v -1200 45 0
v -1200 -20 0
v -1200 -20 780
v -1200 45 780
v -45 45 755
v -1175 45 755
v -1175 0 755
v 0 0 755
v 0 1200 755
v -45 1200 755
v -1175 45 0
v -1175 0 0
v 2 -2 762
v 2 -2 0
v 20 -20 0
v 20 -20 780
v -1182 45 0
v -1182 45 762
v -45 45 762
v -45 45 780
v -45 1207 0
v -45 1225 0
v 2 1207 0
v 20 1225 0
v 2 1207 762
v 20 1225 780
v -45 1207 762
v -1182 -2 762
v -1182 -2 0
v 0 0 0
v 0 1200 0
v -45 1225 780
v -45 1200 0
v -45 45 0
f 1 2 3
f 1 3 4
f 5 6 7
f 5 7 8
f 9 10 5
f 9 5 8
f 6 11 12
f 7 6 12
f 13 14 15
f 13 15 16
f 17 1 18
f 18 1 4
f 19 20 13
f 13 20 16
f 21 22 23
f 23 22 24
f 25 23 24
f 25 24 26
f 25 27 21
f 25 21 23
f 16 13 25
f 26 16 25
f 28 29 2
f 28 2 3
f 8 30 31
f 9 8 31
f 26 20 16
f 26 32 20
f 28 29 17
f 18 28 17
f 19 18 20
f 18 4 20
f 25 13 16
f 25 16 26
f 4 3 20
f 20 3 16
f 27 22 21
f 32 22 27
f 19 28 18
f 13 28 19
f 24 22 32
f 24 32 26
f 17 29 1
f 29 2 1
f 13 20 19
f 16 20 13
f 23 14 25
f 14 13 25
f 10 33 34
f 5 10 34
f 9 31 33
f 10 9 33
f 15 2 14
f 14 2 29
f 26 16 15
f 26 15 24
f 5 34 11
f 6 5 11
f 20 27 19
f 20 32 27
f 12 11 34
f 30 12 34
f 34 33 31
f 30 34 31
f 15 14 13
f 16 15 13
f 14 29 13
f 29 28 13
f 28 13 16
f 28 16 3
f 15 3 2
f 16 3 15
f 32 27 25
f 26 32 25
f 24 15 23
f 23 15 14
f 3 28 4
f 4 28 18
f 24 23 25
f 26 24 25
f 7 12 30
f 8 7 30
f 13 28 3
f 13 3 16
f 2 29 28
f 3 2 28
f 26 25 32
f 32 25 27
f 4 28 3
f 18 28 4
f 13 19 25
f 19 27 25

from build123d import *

# Parameters (mm, degrees)
F1_DEPTH   = 755
F3_W       = 1220
F3_H       = 780
F4_DEPTH   = 18
F5_SIZE    = 17.99999
F7_W       = 1245
F7_H       = 780
F8_DEPTH   = 18
F9_SIZE    = 17.99999
F11_W      = 65
F11_H      = 780
F12_DEPTH  = 18
F13_SIZE   = 17.99999
F15_W      = 65
F15_H      = 780
F16_DEPTH  = 18
F17_SIZE   = 17.99999
F22_DEPTH  = 18
F23_DEPTH  = 18
F24_SIZE   = 17.99999
F24_2_SIZE = 17.99999


# Not quite as in the source:
# - a fillet or chamfer is up to 0.001 mm smaller than in the source, because OpenCascade refuses the exact size


with BuildPart() as f1:
    # F0 (on Top) → F1 (new body)
    with BuildSketch(Plane.XY):
        Polygon((-1175, 45), (-1175, 0), (0, 0), (0, 1200), (-45, 1200), (-45, 45), align=None)
    extrude(amount=F1_DEPTH)


with BuildPart() as f4:
    # F3 (on offset) → F4 (new body)
    with BuildSketch(Plane.XZ.offset(20)):
        with Locations((-590, 390)):
            Rectangle(F3_W, F3_H)
    extrude(amount=-F4_DEPTH)

    # F5 (size 18 in the source; OpenCascade refuses exactly that, so slightly less here)
    f5_edges = [f4.edges().sort_by_distance(p)[0] for p in [
        (20, -2, 390),
        (-590, -2, 780),
        (-1200, -2, 390),
    ]]
    chamfer(f5_edges, length=F5_SIZE)


with BuildPart() as f8:
    # F7 (on offset) → F8 (new body)
    with BuildSketch(Plane.YZ.offset(20)):
        with Locations((602.5, 390)):
            Rectangle(F7_W, F7_H)
    extrude(amount=-F8_DEPTH)

    # F9 (size 18 in the source; OpenCascade refuses exactly that, so slightly less here)
    f9_edges = [f8.edges().sort_by_distance(p)[0] for p in [
        (2, -20, 390),
        (2, 602.5, 780),
        (2, 1225, 390),
    ]]
    chamfer(f9_edges, length=F9_SIZE)


with BuildPart() as f12:
    # F11 (on face) → F12 (new body)
    with BuildSketch(Plane.YZ.offset(-1200)):
        with Locations((12.5, 390)):
            Rectangle(F11_W, F11_H)
    extrude(amount=F12_DEPTH)

    # F13 (size 18 in the source; OpenCascade refuses exactly that, so slightly less here)
    f13_edges = [f12.edges().sort_by_distance(p)[0] for p in [
        (-1182, 12.5, 780),
        (-1182, -20, 390),
    ]]
    chamfer(f13_edges, length=F13_SIZE)


with BuildPart() as f16:
    # F15 (on face) → F16 (new body)
    with BuildSketch(Plane.XZ.offset(-1225)):
        with Locations((-12.5, 390)):
            Rectangle(F15_W, F15_H)
    extrude(amount=F16_DEPTH)

    # F17 (size 18 in the source; OpenCascade refuses exactly that, so slightly less here)
    f17_edges = [f16.edges().sort_by_distance(p)[0] for p in [
        (20, 1207, 390),
        (-12.5, 1207, 780),
    ]]
    chamfer(f17_edges, length=F17_SIZE)


with BuildPart() as f22:
    # F21 (on face) → F22 (new body)
    with BuildSketch(Plane(origin=(0, 0, 780), x_dir=(1, 0, 0), z_dir=(0, 0, -1))):
        Polygon((-1200, 20), (-1200, -45), (-45, -45), (20, 20), align=None)
    extrude(amount=F22_DEPTH)

    # F24 (size 18 in the source; OpenCascade refuses exactly that, so slightly less here)
    f24_edges = [f22.edges().sort_by_distance(p)[0] for p in [
        (-1200, 12.5, 762),
        (-590, -20, 762),
    ]]
    chamfer(f24_edges, length=F24_SIZE)


with BuildPart() as f23:
    # F19 (on face) → F23 (new body)
    with BuildSketch(Plane.XY.offset(780)):
        Polygon((-45, 45), (20, -20), (20, 1225), (-45, 1225), align=None)
    extrude(amount=-F23_DEPTH)

    # F24#2 (size 18 in the source; OpenCascade refuses exactly that, so slightly less here)
    f24_2_edges = [f23.edges().sort_by_distance(p)[0] for p in [
        (20, 602.5, 762),
        (-12.5, 1225, 762),
    ]]
    chamfer(f24_2_edges, length=F24_2_SIZE)


solid = Compound([f1.part, f4.part, f8.part, f12.part, f16.part, f22.part, f23.part])
